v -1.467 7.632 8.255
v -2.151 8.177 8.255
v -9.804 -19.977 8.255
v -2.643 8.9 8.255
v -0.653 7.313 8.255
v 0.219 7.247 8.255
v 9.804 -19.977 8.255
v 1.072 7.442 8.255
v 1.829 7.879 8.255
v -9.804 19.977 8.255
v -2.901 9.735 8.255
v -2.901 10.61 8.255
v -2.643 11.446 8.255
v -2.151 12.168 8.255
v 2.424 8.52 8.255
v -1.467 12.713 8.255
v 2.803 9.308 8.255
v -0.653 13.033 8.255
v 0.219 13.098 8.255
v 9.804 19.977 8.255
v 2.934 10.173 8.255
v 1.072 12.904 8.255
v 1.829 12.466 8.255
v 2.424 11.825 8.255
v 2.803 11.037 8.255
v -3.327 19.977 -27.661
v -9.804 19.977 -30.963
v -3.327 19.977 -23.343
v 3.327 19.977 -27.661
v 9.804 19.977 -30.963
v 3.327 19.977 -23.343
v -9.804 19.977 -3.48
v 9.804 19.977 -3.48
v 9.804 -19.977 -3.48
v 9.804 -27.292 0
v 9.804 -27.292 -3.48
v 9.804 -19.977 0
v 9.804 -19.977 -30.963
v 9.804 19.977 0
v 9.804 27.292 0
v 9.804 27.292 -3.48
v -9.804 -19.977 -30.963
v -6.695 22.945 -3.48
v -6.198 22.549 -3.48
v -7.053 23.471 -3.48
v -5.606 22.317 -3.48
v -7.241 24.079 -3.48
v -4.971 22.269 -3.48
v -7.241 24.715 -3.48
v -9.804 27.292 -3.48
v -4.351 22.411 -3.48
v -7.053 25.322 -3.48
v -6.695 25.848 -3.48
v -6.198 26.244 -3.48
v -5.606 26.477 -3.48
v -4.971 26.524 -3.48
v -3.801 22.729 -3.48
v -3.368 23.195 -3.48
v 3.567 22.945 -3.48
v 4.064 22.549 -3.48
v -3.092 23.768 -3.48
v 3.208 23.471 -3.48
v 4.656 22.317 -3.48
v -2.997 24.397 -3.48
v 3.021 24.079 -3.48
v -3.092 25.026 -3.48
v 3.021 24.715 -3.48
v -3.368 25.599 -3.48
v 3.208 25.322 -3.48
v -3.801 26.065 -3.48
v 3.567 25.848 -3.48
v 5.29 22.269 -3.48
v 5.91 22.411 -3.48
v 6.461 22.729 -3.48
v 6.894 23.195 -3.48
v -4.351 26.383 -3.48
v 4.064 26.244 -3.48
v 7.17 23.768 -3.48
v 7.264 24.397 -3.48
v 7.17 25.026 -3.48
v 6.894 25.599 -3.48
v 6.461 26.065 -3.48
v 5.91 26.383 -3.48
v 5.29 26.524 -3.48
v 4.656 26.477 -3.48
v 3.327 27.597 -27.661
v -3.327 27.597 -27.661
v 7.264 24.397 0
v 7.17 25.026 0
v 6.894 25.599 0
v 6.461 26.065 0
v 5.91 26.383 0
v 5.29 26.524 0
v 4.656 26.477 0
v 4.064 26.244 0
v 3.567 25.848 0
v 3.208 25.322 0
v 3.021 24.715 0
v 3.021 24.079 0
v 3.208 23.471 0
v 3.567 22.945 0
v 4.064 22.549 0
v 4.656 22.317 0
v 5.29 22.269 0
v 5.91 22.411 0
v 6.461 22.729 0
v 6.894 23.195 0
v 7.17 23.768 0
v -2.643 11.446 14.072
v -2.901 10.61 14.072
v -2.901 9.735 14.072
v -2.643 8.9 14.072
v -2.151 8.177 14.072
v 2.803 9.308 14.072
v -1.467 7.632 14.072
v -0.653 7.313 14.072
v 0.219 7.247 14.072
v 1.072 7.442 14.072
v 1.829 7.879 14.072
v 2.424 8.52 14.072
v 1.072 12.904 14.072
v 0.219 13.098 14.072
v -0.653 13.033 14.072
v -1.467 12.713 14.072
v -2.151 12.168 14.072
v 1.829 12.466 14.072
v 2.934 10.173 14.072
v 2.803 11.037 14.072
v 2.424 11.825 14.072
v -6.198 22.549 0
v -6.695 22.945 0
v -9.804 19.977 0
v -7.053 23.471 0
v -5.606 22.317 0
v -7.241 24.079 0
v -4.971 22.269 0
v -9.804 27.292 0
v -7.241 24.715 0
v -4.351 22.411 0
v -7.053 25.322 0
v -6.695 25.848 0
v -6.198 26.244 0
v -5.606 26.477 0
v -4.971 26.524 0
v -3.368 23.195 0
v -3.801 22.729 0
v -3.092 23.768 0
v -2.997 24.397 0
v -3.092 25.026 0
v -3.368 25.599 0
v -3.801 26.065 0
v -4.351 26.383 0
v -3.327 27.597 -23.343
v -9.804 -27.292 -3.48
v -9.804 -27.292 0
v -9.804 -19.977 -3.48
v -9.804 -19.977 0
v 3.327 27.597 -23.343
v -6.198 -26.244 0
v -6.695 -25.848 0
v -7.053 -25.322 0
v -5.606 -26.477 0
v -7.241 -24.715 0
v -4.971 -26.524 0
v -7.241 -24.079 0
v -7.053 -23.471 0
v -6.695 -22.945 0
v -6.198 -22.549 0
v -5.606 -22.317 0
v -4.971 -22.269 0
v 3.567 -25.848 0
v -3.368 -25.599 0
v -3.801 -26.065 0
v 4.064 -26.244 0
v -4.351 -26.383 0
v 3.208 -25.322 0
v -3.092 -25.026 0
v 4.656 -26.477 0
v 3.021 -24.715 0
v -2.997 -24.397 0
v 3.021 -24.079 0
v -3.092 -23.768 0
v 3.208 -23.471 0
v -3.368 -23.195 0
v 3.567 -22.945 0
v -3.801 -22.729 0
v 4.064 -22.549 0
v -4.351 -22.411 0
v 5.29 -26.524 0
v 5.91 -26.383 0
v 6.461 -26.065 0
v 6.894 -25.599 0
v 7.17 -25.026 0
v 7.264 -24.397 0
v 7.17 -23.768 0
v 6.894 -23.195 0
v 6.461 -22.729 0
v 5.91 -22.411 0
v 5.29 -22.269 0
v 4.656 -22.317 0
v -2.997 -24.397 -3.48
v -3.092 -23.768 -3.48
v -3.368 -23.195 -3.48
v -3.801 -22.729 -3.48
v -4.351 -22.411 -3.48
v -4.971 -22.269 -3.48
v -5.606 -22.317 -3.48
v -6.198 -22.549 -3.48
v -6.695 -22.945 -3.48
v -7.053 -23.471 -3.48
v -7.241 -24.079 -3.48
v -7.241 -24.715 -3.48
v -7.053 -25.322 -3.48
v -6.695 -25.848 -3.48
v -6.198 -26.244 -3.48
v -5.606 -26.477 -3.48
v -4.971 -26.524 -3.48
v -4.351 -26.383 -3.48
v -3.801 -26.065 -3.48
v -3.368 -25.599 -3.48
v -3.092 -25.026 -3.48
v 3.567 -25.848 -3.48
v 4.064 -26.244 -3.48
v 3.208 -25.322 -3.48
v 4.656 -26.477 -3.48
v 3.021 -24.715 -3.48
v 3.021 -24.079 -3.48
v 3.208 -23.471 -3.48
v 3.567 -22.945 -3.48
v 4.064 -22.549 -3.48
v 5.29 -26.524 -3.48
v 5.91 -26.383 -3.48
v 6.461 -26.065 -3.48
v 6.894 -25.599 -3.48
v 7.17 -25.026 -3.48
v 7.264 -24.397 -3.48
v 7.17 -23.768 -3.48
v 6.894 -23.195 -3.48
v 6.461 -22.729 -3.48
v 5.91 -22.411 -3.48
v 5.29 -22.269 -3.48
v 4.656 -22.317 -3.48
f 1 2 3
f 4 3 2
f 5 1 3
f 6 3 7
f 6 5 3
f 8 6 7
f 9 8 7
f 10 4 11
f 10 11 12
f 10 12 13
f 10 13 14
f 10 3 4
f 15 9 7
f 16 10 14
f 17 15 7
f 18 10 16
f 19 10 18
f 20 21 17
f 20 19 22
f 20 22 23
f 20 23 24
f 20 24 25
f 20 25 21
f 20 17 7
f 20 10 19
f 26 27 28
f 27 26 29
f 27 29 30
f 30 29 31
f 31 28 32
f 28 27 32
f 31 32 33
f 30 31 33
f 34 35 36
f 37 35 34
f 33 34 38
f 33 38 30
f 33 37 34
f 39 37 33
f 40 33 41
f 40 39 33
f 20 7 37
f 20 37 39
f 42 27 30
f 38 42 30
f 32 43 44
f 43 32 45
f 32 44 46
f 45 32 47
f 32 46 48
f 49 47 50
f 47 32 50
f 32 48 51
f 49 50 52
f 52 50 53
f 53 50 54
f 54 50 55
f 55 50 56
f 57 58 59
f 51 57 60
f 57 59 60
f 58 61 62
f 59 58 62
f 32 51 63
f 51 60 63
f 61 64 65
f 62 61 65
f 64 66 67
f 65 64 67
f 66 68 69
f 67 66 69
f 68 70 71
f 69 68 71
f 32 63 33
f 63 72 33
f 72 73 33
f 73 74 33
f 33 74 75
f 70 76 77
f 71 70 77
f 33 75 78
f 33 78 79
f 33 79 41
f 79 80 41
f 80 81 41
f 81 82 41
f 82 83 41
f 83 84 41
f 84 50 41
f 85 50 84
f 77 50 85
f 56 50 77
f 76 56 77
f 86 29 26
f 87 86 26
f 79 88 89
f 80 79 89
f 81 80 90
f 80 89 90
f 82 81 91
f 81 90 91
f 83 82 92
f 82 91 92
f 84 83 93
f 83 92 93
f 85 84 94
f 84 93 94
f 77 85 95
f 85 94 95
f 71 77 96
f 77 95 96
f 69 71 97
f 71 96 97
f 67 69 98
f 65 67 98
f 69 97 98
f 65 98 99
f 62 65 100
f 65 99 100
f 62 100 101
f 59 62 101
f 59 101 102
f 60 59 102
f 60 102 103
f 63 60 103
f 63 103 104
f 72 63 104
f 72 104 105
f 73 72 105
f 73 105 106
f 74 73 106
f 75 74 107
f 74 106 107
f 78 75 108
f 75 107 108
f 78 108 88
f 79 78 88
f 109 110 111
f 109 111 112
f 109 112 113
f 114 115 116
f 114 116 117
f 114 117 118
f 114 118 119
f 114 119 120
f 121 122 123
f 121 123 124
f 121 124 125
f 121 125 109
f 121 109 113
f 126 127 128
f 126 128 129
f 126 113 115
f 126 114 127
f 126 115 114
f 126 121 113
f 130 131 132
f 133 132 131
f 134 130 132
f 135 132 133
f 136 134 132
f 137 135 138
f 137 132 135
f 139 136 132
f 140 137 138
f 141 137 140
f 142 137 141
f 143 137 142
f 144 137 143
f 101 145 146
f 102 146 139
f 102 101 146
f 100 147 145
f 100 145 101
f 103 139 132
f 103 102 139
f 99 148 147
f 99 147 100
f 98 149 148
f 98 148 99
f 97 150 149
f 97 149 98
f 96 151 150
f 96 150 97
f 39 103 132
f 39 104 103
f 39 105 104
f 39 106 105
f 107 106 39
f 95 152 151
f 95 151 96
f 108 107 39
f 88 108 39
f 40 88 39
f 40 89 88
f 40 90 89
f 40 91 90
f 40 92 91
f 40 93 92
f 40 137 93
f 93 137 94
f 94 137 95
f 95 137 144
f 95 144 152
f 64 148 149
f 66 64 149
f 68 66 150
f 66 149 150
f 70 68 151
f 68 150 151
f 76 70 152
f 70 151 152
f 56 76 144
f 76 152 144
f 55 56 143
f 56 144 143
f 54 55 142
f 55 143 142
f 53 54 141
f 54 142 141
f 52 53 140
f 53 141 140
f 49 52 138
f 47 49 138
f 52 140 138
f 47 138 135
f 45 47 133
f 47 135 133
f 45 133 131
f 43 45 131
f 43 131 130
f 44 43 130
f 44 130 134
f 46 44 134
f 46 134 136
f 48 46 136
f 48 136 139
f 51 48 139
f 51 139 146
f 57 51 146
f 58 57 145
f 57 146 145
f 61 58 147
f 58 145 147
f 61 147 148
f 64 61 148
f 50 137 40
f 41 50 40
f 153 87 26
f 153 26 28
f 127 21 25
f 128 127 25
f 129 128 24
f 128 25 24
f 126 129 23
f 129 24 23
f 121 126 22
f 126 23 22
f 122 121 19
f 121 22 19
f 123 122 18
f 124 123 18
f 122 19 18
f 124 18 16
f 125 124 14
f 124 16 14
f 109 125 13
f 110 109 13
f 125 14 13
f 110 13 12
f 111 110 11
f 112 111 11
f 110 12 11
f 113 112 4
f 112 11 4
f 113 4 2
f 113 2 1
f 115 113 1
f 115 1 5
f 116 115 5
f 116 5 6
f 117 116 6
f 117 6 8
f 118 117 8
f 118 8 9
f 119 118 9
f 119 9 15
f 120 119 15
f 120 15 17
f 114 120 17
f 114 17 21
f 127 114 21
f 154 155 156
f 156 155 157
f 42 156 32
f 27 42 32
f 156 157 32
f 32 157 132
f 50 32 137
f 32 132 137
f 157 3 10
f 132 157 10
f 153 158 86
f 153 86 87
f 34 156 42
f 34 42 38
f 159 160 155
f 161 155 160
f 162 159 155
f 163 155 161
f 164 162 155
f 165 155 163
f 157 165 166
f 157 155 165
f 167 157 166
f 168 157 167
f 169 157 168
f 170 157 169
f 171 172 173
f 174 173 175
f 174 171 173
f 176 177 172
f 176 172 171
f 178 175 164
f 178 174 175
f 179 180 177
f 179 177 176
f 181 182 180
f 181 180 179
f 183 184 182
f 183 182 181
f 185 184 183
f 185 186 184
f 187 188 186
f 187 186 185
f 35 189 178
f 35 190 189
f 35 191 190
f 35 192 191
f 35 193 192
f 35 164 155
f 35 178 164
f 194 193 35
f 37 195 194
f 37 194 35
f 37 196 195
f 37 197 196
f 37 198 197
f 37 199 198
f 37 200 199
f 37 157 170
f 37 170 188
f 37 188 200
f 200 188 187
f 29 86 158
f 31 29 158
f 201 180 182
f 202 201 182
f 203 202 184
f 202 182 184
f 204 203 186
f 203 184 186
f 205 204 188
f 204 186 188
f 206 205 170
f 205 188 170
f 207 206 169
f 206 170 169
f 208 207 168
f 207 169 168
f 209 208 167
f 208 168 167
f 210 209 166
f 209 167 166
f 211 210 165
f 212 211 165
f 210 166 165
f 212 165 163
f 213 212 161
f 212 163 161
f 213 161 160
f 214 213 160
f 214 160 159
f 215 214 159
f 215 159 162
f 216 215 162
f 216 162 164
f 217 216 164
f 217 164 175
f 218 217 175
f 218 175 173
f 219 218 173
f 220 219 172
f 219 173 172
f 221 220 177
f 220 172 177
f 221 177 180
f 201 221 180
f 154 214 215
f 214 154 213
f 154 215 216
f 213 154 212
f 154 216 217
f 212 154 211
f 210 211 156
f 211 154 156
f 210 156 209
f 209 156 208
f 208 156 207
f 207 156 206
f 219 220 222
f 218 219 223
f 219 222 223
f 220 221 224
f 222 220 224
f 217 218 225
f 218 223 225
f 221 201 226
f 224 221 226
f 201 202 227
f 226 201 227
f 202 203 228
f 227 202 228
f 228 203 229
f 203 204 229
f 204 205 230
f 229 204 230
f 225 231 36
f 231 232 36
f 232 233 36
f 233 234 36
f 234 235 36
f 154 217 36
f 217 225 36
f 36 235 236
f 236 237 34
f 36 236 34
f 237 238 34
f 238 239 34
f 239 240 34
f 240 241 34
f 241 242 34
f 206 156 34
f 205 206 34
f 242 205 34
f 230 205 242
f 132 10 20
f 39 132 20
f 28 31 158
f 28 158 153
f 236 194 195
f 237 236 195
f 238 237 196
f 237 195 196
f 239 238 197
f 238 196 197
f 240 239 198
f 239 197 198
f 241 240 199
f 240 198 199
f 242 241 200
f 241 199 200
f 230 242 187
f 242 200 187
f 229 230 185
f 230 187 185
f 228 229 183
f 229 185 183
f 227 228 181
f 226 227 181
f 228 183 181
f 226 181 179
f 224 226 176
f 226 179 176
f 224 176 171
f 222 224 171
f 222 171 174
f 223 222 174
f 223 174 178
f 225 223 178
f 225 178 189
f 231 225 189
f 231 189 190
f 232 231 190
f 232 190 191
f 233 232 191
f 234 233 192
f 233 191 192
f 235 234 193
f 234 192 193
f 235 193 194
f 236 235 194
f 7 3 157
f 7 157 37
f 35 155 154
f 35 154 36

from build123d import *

# Parameters (mm, degrees)
F4_R          = 2.9337
F5_DEPTH      = 14.0716
F4_W          = 19.6088
F4_H          = 39.9542
F6_DEPTH      = 8.255
F6_DEPTH_BACK = 30.9626
F4_H_2        = 7.3152
F4_R_2        = 2.1336
F7_DEPTH      = 3.4798
F9_W          = 6.6548
F9_H          = 4.318
F10_DEPTH     = 7.62


# Not quite as in the source:
# - a variable given as a bare number and used for a length is read in inches; the dataset says mm whatever the document's units were


with BuildPart() as f5:
    # F4 (on Top) → F5 (new body)
    with BuildSketch(Plane.XY):
        with Locations((0, 10.1727)):
            Circle(F4_R)
    extrude(amount=F5_DEPTH)

    # F4 (on Top) → F6 (join, two sides)
    with BuildSketch(Plane.XY) as f6_sk:
        Rectangle(F4_W, F4_H)
        with Locations((0, 10.1727)):
            Circle(F4_R, mode=Mode.SUBTRACT)
        with Locations((0, 10.1727)):
            Circle(F4_R)
    extrude(amount=F6_DEPTH)
    extrude(f6_sk.sketch, amount=-F6_DEPTH_BACK)

    # F4 (on Top) → F7 (join)
    with BuildSketch(Plane.XY):
        with Locations((0, 23.6347)):
            Rectangle(F4_W, F4_H_2)
        with Locations((-5.1308, 24.3967)):
            Circle(F4_R_2, mode=Mode.SUBTRACT)
        with Locations((5.1308, 24.3967)):
            Circle(F4_R_2, mode=Mode.SUBTRACT)
        with Locations((0, -23.6347)):
            Rectangle(F4_W, F4_H_2)
        with Locations((-5.1308, -24.3967)):
            Circle(F4_R_2, mode=Mode.SUBTRACT)
        with Locations((5.1308, -24.3967)):
            Circle(F4_R_2, mode=Mode.SUBTRACT)
    extrude(amount=-F7_DEPTH)

    # F9 (on face) → F10 (join)
    with BuildSketch(Plane(origin=(0, 19.9771, 0), x_dir=(-1, 0, 0), z_dir=(0, 1, 0))):
        with Locations((0, -25.5016)):
            Rectangle(F9_W, F9_H)
    extrude(amount=F10_DEPTH)


solid = f5.part
